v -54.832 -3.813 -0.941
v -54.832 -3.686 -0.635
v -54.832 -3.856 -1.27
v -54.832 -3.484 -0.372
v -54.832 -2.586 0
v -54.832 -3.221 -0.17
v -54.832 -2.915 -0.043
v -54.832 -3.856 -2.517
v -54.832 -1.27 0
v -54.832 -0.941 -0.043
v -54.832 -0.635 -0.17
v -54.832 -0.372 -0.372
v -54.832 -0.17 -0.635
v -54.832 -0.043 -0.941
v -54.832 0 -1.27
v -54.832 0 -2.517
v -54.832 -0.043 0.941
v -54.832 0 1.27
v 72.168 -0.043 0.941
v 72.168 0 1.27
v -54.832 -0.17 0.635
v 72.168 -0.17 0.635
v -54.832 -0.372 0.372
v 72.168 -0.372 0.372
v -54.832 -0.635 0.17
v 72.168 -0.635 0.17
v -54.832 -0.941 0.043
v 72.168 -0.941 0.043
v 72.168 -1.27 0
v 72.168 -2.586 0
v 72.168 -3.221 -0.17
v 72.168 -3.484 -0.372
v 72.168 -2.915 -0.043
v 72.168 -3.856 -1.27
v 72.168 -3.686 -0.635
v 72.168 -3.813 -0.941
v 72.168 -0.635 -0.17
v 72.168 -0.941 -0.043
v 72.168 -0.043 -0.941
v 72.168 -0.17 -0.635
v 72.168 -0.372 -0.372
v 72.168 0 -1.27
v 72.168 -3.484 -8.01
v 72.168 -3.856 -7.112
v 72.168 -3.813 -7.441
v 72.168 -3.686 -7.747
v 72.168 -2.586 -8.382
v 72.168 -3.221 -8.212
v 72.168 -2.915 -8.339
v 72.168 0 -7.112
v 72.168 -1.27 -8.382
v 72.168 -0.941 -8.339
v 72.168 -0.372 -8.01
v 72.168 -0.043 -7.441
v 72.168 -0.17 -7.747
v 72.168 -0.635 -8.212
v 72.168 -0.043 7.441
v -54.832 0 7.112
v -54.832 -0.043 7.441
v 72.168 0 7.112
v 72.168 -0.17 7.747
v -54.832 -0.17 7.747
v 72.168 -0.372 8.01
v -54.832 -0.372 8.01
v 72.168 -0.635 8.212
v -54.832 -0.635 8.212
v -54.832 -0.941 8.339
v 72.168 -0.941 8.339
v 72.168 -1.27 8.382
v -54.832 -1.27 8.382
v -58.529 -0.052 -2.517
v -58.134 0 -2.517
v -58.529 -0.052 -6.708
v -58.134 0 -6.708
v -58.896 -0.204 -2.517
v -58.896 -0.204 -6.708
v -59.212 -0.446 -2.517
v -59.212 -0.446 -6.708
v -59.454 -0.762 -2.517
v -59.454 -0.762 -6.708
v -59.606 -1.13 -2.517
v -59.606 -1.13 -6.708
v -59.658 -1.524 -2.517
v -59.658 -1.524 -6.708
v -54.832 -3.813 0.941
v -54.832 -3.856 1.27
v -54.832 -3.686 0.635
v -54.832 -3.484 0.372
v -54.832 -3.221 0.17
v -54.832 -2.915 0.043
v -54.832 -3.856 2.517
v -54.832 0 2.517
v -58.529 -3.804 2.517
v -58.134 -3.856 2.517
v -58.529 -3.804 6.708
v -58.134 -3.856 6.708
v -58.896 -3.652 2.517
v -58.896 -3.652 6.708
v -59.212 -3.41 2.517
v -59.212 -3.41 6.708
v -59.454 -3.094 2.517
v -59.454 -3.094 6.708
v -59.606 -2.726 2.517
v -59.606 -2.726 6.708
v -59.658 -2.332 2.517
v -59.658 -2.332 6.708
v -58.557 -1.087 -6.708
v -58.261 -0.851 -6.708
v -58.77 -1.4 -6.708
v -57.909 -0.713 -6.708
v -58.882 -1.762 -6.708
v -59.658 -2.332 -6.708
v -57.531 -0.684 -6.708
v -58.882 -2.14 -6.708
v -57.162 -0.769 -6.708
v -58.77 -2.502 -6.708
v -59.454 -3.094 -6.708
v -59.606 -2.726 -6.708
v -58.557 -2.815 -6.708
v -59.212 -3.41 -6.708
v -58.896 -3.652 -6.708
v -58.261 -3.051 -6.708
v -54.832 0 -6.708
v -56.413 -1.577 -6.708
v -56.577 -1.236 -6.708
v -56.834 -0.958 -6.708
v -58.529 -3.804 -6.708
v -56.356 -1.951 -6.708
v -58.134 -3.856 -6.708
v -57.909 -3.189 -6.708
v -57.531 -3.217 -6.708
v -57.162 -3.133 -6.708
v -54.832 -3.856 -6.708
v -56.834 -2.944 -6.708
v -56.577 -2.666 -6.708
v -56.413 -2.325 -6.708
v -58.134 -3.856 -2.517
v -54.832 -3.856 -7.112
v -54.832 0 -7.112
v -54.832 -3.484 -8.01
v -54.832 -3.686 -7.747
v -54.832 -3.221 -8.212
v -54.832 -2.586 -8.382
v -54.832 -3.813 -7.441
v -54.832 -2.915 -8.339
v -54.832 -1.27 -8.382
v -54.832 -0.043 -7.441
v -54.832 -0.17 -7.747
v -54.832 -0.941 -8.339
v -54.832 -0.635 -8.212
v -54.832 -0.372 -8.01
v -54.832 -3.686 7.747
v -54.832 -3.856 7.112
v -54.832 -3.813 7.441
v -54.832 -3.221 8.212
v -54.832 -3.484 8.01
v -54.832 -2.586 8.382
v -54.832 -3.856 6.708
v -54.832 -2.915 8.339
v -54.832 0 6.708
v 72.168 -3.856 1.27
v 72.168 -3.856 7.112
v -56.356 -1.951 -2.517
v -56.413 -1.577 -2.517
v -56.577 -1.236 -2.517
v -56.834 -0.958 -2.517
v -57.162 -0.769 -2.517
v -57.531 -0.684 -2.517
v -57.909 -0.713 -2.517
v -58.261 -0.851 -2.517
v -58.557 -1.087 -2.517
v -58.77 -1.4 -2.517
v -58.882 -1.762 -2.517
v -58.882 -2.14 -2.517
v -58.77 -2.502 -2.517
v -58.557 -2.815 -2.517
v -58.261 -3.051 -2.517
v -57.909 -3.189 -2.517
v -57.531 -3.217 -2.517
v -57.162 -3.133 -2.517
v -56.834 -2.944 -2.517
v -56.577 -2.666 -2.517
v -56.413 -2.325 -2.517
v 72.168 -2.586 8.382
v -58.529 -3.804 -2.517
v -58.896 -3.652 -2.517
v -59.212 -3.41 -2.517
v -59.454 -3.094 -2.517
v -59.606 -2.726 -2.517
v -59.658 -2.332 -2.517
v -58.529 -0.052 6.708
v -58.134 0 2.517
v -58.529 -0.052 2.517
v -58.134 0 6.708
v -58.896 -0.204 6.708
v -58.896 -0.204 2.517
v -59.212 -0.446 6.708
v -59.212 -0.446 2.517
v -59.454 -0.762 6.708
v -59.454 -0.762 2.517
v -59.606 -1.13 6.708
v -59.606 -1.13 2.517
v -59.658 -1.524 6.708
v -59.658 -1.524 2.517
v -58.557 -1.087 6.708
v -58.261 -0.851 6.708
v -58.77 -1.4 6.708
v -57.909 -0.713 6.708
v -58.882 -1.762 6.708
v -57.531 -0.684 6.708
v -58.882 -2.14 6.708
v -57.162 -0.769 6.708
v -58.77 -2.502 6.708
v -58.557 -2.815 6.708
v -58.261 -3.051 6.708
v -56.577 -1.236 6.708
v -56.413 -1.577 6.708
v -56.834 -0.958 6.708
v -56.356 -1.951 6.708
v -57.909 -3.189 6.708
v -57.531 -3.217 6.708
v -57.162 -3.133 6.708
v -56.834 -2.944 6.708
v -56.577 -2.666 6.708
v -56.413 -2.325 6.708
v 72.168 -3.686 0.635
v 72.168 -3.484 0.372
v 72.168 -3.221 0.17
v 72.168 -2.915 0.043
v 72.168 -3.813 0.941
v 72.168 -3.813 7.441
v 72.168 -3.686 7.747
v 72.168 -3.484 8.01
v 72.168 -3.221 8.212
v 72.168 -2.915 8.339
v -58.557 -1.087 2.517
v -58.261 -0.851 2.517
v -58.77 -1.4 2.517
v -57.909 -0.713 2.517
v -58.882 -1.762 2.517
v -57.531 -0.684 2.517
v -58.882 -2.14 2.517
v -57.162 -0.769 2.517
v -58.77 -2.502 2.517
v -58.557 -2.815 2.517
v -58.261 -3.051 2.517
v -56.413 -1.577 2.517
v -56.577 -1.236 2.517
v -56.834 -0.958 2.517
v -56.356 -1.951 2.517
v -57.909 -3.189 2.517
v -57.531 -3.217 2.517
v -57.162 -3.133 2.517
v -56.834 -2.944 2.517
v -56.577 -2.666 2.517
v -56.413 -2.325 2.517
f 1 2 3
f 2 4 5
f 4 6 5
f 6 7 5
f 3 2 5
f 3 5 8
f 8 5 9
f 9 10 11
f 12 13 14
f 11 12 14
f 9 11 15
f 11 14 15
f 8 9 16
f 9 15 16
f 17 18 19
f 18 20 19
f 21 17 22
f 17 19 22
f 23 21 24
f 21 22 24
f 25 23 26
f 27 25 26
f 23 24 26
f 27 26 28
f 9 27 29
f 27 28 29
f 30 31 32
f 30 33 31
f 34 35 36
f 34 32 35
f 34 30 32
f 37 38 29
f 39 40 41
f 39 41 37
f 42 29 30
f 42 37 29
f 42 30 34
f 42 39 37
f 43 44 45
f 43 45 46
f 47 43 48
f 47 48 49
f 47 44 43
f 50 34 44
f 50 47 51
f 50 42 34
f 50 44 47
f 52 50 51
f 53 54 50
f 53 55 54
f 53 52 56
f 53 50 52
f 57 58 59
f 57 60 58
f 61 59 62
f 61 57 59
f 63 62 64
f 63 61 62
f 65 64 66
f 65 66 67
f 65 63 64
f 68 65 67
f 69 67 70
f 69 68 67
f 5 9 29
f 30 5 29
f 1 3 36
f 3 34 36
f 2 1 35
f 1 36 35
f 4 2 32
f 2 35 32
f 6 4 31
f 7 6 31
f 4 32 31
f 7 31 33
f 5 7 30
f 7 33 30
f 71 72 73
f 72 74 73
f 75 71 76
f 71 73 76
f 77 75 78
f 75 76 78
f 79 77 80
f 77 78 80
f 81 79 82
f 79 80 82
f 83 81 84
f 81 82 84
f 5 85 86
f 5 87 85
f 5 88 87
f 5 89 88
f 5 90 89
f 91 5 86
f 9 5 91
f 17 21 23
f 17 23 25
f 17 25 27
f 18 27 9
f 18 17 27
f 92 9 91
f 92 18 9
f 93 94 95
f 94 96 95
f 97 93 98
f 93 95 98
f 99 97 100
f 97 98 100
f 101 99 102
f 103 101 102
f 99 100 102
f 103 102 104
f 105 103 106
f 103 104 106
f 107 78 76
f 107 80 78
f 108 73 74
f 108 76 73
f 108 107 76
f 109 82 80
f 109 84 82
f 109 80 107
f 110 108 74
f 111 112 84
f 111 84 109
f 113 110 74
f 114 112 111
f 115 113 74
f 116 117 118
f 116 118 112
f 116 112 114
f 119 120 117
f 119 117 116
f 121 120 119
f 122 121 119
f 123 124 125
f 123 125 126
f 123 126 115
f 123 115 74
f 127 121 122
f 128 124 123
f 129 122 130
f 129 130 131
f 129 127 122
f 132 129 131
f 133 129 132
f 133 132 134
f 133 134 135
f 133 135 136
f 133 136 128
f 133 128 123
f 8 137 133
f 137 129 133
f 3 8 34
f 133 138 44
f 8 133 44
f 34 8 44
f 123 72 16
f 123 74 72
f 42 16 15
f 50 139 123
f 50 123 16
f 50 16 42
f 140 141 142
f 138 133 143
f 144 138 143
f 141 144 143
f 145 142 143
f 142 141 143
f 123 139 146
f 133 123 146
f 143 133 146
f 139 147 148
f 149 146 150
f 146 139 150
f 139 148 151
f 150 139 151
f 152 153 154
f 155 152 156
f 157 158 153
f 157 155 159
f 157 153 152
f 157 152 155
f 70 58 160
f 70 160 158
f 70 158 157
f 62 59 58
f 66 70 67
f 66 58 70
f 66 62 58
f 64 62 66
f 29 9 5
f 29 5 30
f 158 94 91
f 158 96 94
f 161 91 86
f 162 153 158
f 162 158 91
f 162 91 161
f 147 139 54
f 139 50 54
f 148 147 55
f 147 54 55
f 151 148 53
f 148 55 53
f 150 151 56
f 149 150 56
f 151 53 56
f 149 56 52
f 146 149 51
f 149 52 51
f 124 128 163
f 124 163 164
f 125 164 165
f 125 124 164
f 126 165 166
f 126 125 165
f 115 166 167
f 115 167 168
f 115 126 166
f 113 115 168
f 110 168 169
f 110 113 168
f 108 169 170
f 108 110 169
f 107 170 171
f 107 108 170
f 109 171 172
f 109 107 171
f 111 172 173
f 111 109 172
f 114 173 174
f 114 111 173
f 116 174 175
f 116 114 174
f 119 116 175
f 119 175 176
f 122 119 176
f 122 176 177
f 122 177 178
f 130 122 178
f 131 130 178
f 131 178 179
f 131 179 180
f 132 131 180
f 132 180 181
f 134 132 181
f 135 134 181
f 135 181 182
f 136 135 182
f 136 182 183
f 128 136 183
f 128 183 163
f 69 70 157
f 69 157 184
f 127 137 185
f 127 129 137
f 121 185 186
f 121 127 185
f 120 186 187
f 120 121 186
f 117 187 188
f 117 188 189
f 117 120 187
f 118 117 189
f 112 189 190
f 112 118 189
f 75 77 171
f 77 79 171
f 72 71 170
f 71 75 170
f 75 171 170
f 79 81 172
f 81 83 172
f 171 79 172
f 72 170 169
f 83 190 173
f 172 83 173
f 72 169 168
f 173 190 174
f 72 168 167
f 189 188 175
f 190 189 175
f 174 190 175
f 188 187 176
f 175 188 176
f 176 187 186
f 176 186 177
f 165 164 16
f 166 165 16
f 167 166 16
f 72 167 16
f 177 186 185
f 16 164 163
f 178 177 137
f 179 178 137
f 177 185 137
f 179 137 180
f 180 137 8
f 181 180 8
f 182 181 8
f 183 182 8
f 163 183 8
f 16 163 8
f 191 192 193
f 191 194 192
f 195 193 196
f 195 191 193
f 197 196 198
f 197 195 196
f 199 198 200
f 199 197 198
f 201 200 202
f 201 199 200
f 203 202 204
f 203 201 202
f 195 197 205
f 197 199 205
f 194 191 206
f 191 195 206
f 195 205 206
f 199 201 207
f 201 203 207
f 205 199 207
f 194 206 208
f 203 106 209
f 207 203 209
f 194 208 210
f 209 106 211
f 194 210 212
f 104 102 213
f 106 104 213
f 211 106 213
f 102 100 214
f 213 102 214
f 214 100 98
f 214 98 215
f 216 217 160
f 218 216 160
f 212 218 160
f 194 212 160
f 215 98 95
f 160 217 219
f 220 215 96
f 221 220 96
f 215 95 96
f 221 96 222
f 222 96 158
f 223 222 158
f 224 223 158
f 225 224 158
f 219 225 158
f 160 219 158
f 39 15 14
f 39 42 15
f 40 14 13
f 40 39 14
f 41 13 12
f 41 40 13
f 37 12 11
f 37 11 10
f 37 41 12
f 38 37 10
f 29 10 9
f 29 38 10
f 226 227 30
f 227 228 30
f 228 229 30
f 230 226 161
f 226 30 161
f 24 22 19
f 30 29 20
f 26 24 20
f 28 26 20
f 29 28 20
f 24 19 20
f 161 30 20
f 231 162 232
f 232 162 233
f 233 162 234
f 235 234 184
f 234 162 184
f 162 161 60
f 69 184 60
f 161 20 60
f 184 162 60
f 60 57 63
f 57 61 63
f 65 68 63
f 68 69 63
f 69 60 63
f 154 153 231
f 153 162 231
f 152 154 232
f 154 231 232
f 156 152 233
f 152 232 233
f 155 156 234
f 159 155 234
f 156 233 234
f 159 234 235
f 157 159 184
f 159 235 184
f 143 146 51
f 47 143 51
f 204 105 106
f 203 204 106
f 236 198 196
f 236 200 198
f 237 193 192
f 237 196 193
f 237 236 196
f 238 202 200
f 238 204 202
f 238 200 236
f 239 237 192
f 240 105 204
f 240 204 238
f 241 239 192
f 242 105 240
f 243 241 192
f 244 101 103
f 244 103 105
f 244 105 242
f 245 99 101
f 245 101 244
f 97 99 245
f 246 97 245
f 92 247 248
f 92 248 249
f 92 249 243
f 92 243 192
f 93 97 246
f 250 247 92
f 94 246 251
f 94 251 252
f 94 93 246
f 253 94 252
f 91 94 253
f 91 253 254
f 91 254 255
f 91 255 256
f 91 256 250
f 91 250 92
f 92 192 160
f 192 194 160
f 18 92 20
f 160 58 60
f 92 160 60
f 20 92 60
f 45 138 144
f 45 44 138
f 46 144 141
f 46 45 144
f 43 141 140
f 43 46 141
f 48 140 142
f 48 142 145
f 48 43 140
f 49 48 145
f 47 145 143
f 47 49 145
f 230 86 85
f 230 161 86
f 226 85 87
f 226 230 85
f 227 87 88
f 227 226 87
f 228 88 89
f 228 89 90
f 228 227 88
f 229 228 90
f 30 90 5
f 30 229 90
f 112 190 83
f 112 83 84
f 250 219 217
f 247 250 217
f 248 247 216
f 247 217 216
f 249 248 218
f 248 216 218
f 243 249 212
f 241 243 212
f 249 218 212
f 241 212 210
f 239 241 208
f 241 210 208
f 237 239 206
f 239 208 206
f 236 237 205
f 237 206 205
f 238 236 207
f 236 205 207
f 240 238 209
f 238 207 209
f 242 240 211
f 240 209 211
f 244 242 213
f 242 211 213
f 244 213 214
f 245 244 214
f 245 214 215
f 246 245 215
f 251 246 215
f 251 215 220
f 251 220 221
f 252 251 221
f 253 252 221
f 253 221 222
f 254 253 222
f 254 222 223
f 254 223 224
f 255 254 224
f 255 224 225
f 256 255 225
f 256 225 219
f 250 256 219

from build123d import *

# Parameters (mm, degrees)
F0_W     = 127
F0_H     = 8.382
F1_DEPTH = 3.855923
F2_W     = 4.826
F2_H     = 4.191
F3_DEPTH = 3.855923
F4_R     = 1.27
F5_DEPTH = 6.70947
F6_R     = 1.27
F7_R     = 1.524


with BuildPart() as f1:
    # F0 (on Front) → F1 (new body)
    with BuildSketch(Plane.XZ):
        with Locations((8.667751, 4.191)):
            Rectangle(F0_W, F0_H)
    extrude(amount=F1_DEPTH)

    # F2 (on face) → F3 (join)
    with BuildSketch(Plane.XZ.offset(3.855923)):
        with Locations((-57.245249, 4.61297)):
            Rectangle(F2_W, F2_H)
    extrude(amount=-F3_DEPTH)

    # F4 (on face) → F5 (cut, through all)
    with BuildSketch(Plane.XY.offset(6.70847)):
        with Locations((-57.626249, -1.950923)):
            Circle(F4_R)
    extrude(amount=-F5_DEPTH, mode=Mode.SUBTRACT)

    # F6
    f6_edges = [f1.edges().sort_by_distance(p)[0] for p in [
        (8.667751, -3.855923, 8.382),
        (8.667751, 0, 8.382),
        (8.667751, -3.855923, 0),
        (8.667751, 0, 0),
    ]]
    fillet(f6_edges, radius=F6_R)

    # F7
    f7_edges = [f1.edges().sort_by_distance(p)[0] for p in [
        (-59.658249, -3.855923, 4.61297),
        (-59.658249, 0, 4.61297),
    ]]
    fillet(f7_edges, radius=F7_R)


with BuildPart() as f8_1:
    # F8: instance of F1
    add(f1.part.mirror(Plane.XY))


solid = Compound([f1.part, f8_1.part])
